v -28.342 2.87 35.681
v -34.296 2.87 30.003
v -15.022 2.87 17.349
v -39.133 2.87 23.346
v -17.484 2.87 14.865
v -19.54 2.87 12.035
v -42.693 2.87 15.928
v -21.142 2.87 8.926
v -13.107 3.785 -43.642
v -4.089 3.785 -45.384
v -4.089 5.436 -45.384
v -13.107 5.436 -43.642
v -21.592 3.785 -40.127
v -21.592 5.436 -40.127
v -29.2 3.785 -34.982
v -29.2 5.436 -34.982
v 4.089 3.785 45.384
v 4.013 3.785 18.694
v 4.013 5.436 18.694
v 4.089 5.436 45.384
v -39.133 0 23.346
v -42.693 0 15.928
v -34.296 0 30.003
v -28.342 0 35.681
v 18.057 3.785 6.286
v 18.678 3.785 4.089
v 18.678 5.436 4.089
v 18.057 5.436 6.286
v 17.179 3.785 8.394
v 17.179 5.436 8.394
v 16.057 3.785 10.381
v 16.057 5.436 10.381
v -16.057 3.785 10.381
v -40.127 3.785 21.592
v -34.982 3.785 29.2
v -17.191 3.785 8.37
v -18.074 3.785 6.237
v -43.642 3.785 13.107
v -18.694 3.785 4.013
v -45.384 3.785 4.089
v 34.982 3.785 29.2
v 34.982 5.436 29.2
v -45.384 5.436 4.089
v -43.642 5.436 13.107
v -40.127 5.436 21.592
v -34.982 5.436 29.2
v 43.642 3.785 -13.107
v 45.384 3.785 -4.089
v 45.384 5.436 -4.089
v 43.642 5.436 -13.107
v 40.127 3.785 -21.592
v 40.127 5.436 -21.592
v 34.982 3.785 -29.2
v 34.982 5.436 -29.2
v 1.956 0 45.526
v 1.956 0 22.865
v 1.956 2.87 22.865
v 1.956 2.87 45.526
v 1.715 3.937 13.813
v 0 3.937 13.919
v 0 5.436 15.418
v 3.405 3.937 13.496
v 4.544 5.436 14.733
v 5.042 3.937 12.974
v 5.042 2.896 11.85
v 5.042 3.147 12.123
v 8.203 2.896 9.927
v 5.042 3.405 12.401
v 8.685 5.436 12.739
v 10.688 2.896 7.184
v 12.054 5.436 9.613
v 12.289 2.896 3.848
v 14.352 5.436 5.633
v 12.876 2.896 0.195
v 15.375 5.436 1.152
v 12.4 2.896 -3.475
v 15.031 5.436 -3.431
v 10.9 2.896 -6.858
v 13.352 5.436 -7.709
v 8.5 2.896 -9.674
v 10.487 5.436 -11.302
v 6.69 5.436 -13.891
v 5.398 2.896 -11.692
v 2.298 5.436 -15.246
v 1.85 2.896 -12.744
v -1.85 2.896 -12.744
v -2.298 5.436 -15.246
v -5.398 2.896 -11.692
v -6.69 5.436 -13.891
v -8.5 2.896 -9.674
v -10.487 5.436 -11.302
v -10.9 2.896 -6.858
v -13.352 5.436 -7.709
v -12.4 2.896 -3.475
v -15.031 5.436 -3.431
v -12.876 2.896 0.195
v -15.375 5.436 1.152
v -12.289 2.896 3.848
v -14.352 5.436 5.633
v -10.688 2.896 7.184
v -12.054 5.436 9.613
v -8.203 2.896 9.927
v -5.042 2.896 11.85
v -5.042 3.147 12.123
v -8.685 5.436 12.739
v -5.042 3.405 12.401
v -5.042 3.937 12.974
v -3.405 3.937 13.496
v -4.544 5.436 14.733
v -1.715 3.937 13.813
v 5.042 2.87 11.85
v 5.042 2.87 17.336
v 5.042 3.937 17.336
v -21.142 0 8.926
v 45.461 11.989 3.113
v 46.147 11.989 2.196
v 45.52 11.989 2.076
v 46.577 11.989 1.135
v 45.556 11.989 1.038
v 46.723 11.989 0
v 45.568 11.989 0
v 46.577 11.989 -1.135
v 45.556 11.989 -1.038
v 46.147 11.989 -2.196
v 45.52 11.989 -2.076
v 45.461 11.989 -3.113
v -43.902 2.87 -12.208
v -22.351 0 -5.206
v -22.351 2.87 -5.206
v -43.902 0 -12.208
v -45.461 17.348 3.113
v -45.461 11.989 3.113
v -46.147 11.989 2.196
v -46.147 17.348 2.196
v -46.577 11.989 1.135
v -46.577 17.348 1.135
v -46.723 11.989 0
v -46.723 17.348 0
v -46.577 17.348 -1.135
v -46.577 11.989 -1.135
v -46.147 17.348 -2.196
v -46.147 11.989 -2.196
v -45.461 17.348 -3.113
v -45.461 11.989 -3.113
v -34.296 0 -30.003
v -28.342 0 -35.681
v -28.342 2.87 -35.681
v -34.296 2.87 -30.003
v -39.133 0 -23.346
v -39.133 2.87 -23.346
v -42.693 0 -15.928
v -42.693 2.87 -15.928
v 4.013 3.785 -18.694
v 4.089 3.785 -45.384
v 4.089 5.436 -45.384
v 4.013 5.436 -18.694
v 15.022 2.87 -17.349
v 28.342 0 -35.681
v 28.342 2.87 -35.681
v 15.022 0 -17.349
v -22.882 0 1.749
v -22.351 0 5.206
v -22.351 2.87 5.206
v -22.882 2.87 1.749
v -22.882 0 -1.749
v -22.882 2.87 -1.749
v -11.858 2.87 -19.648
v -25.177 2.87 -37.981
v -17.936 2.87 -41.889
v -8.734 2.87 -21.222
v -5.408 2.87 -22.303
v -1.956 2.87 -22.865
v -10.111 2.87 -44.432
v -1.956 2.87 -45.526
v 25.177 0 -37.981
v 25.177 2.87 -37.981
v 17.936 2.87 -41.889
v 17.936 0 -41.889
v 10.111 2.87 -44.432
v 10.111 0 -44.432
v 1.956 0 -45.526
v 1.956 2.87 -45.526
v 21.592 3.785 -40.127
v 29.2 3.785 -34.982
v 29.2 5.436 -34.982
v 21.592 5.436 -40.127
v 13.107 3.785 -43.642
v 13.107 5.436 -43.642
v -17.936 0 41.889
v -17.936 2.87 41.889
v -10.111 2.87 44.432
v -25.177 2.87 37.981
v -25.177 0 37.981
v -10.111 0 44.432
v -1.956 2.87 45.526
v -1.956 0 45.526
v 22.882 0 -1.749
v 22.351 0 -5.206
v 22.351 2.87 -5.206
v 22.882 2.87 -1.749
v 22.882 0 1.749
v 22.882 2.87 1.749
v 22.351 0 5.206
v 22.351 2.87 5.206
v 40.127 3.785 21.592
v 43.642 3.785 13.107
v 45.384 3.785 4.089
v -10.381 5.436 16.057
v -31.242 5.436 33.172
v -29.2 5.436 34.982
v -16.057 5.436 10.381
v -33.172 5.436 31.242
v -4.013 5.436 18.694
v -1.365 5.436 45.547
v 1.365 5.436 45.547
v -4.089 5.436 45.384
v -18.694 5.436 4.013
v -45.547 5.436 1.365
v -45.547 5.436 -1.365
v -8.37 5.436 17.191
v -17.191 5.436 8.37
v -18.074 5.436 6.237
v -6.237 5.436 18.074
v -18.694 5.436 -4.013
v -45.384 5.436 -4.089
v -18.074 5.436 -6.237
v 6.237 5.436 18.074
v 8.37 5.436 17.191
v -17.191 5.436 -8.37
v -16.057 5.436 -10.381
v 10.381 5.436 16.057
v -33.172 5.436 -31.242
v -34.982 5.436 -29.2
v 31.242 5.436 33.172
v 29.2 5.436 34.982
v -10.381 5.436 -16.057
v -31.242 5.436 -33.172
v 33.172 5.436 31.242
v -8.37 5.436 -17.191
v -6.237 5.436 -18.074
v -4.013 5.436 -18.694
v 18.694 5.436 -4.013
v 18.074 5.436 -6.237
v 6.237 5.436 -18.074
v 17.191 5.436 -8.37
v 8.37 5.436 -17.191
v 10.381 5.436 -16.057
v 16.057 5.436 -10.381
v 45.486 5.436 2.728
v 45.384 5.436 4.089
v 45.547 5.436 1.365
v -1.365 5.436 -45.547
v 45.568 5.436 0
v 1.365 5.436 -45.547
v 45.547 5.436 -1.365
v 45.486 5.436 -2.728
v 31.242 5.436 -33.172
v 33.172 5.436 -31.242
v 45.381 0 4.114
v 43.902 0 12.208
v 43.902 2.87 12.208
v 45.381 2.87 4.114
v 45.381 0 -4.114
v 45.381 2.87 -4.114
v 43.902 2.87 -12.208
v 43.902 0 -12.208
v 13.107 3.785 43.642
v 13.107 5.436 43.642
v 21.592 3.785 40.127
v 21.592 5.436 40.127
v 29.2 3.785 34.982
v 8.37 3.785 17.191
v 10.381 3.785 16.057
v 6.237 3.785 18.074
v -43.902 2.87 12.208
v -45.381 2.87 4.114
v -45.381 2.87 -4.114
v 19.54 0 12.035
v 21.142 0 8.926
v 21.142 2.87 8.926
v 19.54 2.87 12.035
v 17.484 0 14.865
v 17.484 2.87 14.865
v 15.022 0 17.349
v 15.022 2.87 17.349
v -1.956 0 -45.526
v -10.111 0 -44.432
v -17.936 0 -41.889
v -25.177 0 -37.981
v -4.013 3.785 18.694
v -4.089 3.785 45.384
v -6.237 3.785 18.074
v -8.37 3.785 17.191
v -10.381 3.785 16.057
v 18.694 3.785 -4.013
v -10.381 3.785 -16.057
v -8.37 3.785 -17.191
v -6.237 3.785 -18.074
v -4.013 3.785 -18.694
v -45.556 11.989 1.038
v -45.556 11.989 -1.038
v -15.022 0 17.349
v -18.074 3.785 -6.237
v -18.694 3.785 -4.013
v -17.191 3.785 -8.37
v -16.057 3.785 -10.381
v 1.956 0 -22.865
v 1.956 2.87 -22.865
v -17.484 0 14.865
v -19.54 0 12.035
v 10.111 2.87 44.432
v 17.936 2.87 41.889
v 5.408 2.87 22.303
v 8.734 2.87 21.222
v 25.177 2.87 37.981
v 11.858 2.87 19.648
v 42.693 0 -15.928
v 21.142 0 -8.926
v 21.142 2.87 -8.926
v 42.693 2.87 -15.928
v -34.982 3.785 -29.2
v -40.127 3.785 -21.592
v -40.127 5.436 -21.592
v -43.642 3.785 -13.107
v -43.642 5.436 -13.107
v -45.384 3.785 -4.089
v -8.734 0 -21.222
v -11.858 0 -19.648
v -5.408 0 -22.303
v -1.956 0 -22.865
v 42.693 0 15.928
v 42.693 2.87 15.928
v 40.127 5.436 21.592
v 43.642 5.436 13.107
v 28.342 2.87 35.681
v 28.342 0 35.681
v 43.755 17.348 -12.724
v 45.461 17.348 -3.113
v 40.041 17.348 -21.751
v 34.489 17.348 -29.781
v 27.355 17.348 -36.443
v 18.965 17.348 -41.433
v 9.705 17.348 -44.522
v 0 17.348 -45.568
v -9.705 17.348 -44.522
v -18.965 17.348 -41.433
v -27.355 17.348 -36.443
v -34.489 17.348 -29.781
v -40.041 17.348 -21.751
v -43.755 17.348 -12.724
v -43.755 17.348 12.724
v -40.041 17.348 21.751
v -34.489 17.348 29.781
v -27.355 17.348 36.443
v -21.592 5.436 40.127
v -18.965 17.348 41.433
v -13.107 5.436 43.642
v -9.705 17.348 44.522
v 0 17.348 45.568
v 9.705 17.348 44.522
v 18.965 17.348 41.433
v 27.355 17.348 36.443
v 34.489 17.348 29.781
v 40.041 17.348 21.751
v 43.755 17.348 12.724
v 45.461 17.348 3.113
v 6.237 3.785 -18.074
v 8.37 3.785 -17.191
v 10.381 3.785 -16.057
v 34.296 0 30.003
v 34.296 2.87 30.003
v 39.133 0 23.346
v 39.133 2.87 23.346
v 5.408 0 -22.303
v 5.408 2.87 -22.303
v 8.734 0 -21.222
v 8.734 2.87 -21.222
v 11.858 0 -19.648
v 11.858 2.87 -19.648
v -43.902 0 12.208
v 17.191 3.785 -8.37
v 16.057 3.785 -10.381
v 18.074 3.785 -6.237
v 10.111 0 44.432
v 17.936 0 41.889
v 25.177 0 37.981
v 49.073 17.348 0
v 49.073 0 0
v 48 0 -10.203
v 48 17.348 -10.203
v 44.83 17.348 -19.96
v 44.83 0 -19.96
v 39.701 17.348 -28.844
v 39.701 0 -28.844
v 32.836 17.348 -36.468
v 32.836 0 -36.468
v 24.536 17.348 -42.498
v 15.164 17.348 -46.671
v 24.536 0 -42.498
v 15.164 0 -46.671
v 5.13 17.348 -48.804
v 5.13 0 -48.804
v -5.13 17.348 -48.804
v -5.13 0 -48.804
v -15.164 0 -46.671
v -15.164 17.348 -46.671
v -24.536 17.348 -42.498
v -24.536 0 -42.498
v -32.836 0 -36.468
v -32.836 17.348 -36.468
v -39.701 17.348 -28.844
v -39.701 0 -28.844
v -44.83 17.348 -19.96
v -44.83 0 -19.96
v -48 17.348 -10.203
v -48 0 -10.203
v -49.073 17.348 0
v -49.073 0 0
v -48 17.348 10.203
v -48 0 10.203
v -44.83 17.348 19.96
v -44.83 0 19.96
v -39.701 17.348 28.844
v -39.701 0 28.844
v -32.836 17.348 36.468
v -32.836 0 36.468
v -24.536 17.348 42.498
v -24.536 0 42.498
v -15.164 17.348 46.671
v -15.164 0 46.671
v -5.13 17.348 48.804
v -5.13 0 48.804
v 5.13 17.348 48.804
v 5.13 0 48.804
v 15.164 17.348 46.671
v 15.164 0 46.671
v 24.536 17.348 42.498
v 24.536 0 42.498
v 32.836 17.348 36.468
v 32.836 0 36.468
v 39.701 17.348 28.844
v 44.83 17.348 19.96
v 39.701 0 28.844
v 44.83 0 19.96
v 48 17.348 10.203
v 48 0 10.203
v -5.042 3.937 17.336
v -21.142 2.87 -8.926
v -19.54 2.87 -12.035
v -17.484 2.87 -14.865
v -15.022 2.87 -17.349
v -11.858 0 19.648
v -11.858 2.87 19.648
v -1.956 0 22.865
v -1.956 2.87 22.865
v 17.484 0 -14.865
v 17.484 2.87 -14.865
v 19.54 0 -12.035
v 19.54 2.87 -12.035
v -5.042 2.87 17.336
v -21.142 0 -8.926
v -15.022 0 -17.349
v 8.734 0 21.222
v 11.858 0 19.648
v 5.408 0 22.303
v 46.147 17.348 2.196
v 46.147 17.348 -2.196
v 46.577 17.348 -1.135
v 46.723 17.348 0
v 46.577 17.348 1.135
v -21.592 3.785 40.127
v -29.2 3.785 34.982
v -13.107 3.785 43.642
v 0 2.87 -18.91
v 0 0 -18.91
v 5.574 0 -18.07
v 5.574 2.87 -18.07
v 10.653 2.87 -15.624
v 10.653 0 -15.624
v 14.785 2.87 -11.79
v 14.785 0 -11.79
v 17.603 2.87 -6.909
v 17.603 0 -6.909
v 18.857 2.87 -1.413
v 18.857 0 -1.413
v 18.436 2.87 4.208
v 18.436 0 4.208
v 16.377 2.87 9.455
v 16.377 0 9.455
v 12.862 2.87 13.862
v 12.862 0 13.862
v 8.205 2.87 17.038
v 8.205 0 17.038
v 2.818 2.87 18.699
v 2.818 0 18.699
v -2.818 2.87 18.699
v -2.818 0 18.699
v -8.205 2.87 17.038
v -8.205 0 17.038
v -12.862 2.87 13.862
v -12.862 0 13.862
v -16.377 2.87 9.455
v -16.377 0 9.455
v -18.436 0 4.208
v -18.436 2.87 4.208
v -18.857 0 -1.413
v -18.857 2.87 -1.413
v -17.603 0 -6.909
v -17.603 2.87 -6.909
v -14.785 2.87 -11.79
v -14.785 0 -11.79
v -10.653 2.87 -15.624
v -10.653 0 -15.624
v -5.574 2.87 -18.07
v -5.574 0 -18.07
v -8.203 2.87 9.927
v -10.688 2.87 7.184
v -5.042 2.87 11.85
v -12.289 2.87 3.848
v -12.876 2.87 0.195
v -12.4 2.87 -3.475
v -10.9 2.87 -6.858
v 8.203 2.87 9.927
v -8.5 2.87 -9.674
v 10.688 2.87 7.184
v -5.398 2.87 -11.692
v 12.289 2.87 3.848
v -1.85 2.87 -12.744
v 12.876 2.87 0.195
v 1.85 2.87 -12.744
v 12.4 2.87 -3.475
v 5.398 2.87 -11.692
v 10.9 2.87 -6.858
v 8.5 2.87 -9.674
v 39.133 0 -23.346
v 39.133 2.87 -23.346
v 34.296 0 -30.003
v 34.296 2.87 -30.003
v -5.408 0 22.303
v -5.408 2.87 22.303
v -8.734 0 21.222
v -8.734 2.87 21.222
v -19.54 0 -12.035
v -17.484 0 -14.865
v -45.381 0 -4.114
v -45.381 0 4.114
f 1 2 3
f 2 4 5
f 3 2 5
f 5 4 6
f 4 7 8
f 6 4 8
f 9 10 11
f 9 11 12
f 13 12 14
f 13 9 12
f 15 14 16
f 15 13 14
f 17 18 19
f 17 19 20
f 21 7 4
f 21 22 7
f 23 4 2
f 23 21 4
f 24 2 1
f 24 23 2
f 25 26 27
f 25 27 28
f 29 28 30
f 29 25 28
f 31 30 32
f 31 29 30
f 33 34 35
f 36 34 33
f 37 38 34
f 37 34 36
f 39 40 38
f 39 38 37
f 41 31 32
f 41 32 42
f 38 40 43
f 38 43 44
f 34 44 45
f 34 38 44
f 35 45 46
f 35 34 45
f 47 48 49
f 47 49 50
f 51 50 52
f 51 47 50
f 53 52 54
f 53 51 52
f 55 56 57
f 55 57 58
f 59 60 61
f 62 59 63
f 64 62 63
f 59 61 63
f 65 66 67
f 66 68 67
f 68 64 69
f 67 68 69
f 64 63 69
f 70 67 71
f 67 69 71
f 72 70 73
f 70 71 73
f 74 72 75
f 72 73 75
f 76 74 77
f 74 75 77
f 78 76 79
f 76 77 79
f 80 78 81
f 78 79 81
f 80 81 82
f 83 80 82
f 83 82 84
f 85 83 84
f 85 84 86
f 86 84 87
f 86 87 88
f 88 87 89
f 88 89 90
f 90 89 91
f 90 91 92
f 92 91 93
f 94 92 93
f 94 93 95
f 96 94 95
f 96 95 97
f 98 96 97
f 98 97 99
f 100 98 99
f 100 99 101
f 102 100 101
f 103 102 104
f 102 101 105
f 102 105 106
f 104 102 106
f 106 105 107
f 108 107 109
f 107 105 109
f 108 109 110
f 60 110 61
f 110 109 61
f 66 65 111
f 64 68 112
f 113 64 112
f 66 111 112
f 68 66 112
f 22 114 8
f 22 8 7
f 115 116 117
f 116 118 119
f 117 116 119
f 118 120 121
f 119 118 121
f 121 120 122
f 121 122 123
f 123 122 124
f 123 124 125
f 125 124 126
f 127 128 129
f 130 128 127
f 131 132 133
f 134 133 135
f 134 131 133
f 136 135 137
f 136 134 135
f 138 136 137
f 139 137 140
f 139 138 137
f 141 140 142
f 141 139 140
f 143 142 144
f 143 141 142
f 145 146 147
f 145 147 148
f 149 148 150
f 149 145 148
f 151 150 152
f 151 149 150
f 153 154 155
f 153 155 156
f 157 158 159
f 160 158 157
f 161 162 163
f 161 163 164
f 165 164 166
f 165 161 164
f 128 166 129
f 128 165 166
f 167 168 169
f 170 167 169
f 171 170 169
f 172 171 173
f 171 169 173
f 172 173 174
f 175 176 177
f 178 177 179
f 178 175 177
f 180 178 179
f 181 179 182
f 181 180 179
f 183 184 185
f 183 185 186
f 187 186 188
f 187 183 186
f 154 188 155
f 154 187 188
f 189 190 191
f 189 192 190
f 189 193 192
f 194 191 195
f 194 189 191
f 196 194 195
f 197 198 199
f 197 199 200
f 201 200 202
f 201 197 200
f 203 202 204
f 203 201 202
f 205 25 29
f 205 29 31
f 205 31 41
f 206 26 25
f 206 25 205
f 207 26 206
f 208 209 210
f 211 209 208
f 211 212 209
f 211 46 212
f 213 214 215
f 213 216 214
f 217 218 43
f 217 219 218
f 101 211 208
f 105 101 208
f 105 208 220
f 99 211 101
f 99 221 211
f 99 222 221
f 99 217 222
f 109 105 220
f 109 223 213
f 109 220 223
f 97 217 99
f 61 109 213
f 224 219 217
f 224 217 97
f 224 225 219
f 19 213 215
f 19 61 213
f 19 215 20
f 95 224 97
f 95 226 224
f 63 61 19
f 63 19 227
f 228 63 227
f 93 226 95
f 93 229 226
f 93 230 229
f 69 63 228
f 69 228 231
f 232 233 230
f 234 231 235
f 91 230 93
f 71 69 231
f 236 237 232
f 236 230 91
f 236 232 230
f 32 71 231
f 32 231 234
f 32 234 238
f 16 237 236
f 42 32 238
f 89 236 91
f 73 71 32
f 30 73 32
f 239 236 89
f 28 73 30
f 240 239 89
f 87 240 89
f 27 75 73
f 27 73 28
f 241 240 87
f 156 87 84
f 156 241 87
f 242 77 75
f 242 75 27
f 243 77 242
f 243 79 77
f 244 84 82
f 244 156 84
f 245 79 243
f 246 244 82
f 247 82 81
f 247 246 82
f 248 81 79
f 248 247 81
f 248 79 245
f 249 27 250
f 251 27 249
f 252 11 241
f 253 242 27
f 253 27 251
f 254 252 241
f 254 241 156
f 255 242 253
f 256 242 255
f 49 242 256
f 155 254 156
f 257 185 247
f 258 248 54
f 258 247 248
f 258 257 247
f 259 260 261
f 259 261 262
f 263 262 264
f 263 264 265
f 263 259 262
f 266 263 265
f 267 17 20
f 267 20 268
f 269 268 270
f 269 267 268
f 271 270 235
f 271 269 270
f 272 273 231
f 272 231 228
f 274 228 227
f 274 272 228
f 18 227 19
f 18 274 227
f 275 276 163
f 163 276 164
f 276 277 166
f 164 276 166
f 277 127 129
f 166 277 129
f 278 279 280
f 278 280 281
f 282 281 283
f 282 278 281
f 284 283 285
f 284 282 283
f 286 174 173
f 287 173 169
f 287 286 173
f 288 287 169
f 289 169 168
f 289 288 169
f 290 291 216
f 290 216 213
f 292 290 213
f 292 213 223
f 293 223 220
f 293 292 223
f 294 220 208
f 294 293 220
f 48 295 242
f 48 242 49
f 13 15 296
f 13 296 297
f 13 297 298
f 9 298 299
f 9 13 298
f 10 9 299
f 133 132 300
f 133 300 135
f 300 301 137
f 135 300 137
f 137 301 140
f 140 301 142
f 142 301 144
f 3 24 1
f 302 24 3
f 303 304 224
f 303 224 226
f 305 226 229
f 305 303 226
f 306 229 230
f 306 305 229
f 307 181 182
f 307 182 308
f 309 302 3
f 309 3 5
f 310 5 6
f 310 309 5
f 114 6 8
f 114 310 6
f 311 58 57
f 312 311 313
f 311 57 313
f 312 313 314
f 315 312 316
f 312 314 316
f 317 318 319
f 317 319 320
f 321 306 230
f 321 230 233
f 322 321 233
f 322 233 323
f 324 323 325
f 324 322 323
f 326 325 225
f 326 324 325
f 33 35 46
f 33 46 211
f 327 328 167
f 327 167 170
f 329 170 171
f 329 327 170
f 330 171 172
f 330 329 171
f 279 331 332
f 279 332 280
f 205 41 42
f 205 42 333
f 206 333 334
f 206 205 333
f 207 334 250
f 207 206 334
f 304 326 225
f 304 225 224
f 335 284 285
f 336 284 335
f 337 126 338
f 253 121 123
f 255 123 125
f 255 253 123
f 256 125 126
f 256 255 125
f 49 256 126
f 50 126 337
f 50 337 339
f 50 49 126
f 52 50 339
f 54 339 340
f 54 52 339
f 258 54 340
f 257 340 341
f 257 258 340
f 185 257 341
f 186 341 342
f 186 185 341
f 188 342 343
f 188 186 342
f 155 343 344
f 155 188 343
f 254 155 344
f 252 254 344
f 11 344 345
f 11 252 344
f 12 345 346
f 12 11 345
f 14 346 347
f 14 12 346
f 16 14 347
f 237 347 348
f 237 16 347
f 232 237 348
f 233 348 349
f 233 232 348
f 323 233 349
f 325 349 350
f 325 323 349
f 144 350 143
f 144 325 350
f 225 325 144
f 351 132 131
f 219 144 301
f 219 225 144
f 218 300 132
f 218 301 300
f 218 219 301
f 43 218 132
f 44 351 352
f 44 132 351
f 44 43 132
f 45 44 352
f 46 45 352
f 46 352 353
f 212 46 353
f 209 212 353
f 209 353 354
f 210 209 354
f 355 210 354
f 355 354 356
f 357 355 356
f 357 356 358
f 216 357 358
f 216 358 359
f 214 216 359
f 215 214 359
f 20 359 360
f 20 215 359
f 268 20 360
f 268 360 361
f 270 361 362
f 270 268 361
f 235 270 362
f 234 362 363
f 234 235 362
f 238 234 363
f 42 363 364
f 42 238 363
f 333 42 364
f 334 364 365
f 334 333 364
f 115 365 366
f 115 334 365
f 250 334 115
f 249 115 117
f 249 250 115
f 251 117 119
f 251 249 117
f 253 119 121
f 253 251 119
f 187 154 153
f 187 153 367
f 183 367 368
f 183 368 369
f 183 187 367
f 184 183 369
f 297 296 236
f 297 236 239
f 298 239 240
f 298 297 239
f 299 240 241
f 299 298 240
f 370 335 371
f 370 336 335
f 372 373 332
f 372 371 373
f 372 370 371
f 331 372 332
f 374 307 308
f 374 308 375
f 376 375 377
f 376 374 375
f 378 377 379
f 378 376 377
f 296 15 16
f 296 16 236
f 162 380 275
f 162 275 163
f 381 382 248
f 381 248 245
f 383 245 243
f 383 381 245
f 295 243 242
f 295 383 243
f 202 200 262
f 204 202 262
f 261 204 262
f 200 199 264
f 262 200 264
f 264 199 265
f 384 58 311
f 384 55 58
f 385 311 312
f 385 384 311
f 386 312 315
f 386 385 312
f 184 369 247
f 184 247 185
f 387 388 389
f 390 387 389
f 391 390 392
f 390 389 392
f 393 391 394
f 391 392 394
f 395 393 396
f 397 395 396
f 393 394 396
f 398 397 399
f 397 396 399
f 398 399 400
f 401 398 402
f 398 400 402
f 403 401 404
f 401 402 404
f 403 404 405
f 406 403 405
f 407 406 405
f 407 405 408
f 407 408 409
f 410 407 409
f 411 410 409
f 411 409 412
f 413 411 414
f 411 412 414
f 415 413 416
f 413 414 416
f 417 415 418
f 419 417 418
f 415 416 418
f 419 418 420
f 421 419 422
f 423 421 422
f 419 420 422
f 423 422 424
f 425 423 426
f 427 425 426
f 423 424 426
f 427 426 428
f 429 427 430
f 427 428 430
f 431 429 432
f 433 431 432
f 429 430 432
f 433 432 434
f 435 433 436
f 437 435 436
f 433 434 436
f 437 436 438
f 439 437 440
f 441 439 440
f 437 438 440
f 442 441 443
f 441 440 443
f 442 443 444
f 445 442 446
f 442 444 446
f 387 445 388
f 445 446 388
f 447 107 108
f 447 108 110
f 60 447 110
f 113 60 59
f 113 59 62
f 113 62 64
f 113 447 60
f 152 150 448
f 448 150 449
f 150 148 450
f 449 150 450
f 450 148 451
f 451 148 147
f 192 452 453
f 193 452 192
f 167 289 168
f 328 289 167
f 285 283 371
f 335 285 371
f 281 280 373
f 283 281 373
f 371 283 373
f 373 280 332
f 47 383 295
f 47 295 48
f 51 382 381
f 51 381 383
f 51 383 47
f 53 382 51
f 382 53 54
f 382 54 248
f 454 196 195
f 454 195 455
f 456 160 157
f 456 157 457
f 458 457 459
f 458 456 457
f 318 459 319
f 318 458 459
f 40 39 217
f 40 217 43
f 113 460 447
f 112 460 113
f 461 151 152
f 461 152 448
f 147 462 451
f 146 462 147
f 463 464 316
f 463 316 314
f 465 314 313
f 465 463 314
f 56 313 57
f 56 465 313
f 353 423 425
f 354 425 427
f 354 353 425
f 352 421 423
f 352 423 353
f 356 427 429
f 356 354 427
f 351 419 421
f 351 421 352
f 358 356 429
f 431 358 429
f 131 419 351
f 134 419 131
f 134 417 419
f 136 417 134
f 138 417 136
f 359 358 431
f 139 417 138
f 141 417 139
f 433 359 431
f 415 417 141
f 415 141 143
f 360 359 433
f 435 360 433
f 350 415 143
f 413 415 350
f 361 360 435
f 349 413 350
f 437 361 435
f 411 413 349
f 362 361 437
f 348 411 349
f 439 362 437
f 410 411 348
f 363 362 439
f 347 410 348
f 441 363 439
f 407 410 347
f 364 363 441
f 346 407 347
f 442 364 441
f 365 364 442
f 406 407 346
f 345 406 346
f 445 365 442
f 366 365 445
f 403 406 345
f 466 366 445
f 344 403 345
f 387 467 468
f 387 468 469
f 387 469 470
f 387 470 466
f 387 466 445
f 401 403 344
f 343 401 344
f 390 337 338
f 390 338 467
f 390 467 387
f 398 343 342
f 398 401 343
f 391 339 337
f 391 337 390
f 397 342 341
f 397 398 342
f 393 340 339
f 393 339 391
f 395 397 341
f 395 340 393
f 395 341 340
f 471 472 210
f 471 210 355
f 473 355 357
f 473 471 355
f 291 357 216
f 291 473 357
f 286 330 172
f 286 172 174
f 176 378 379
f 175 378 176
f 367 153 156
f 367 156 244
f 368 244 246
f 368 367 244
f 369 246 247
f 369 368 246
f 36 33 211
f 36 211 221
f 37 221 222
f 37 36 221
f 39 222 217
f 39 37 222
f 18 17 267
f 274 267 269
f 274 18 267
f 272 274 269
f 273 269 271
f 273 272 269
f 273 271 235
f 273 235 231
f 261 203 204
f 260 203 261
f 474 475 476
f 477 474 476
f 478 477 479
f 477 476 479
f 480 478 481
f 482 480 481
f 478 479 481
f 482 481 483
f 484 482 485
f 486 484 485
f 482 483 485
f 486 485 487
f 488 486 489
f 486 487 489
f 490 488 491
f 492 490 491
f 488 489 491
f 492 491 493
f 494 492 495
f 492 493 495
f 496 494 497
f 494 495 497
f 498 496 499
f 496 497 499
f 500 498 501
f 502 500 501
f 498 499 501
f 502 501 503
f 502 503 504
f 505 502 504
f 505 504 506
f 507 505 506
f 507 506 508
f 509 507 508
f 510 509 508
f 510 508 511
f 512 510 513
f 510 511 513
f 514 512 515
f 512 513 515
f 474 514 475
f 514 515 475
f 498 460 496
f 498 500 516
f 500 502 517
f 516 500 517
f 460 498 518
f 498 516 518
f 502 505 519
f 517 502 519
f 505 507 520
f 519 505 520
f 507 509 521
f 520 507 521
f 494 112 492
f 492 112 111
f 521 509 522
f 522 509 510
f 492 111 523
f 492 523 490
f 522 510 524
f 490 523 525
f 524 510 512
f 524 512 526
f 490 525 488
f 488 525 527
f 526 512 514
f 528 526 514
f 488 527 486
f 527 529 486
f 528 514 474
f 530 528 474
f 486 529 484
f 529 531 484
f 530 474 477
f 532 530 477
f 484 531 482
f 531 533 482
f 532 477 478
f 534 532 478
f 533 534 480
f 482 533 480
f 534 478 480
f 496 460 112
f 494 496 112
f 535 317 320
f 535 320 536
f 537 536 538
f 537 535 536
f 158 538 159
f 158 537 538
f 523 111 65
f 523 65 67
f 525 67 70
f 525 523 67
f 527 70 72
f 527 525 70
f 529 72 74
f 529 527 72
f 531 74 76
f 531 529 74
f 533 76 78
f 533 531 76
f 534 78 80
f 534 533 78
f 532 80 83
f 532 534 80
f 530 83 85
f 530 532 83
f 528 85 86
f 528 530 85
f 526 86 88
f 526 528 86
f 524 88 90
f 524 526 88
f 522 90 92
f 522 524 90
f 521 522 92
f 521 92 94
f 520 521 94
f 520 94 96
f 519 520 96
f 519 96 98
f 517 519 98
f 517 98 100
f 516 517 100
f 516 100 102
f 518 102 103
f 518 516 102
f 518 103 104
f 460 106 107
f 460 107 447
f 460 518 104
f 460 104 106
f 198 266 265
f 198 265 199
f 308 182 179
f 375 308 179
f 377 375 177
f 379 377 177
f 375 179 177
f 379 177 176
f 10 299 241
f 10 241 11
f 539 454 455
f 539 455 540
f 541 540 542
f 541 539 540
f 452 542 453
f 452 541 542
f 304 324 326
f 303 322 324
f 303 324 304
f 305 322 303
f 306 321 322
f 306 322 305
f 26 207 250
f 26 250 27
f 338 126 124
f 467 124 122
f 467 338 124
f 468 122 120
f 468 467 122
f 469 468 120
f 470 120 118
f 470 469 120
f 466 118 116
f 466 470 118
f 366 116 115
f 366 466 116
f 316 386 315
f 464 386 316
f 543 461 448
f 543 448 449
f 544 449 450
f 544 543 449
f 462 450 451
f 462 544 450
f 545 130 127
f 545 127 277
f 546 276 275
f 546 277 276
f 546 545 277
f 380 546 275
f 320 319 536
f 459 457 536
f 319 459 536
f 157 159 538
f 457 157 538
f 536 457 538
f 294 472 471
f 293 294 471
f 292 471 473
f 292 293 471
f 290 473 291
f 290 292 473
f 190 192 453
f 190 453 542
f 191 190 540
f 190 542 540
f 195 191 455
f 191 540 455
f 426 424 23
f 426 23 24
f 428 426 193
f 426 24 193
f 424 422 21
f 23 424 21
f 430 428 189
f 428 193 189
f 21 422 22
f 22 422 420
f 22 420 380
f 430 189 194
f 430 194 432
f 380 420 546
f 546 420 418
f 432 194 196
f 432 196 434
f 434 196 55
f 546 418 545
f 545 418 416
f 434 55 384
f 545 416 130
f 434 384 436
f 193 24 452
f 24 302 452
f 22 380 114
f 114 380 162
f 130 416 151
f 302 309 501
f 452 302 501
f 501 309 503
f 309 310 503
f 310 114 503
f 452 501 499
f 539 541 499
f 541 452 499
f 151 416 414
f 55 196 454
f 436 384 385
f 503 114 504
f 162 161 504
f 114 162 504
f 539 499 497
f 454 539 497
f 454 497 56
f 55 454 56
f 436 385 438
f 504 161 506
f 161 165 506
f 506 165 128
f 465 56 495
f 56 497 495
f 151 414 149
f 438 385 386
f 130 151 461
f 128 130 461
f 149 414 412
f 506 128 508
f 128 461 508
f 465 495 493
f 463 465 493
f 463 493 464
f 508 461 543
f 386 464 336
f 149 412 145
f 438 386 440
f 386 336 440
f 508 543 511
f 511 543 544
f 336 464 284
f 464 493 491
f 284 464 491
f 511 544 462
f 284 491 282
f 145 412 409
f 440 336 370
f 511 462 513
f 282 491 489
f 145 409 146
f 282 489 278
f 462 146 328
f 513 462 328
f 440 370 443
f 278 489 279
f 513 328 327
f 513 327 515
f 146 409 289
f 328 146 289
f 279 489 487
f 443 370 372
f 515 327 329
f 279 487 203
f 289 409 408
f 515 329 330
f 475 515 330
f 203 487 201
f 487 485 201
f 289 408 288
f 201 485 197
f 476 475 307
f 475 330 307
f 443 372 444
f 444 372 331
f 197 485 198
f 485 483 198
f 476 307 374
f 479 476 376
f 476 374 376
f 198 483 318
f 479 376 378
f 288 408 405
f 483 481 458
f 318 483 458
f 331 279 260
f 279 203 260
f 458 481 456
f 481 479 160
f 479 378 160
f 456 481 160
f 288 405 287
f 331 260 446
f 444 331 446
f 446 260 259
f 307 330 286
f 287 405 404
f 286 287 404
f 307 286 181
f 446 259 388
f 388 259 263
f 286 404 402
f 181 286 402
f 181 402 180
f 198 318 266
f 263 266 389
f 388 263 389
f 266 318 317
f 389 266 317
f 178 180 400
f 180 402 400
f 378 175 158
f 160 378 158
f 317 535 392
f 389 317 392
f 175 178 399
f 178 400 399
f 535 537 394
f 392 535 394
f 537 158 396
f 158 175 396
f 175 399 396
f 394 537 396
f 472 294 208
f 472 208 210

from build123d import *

# Parameters (mm, degrees)
SKETCH1_R           = 49.0728
SKETCH1_R_2         = 45.5676
EXTRUDE_THIN1_DEPTH = 17.3482
SKETCH2_R           = 18.9103
BOSS_EXTRUDE1_DEPTH = 2.8702
SKETCH3_R           = 48.26
SKETCH3_R_2         = 12.8778
BOSS_EXTRUDE2_DEPTH = 2.5654
CHAMFER1_SIZE       = 2.54
SKETCH4_W           = 10.0838
SKETCH4_H           = 6.023980684
CUT_EXTRUDE1_DEPTH  = 1.0668
CUT_EXTRUDE2_START  = -1.651
CUT_EXTRUDE2_DEPTH  = 1.651
CUT_EXTRUDE3_DEPTH  = 5.3594


with BuildPart() as part:
    # Sketch1 → Extrude-Thin1 (new body)
    with BuildSketch(Plane(origin=(0, 0, 0), x_dir=(1, 0, 0), z_dir=(0, 1, 0))):
        Circle(SKETCH1_R)
        Circle(SKETCH1_R_2, mode=Mode.SUBTRACT)
    extrude(amount=EXTRUDE_THIN1_DEPTH)



with BuildPart() as body_2:
    # Sketch2 → Boss-Extrude1 (new body)
    with BuildSketch(Plane.XZ):
        with BuildLine():
            Line((-1.9558, 45.525608355), (-1.9558, 22.865407444))
            ThreePointArc((-1.9558, 22.865407444), (-7.091600102, 21.825700887), (-11.857673846, 19.648093602))
            Line((-11.857673846, 19.648093602), (-25.177005755, 37.980581235))
            ThreePointArc((-25.177005755, 37.980581235), (-26.783963262, 36.864962793), (-28.34155663, 35.681400442))
            Line((-28.34155663, 35.681400442), (-15.022224721, 17.348912809))
            ThreePointArc((-15.022224721, 17.348912809), (-18.566050102, 13.489024976), (-21.14191931, 8.925875818))
            Line((-21.14191931, 8.925875818), (-42.693051047, 15.928262996))
            ThreePointArc((-42.693051047, 15.928262996), (-43.337362912, 14.081162793), (-43.901801922, 12.208110326))
            Line((-43.901801922, 12.208110326), (-22.350670185, 5.205723149))
            ThreePointArc((-22.350670185, 5.205723149), (-22.9489, 0), (-22.350670185, -5.205723149))
            Line((-22.350670185, -5.205723149), (-43.901801922, -12.208110326))
            ThreePointArc((-43.901801922, -12.208110326), (-43.337362912, -14.081162793), (-42.693051047, -15.928262996))
            Line((-42.693051047, -15.928262996), (-21.14191931, -8.925875818))
            ThreePointArc((-21.14191931, -8.925875818), (-18.566050102, -13.489024976), (-15.022224721, -17.348912809))
            Line((-15.022224721, -17.348912809), (-28.34155663, -35.681400442))
            ThreePointArc((-28.34155663, -35.681400442), (-26.783963262, -36.864962793), (-25.177005755, -37.980581235))
            Line((-25.177005755, -37.980581235), (-11.857673846, -19.648093602))
            ThreePointArc((-11.857673846, -19.648093602), (-7.091600102, -21.825700887), (-1.9558, -22.865407444))
            Line((-1.9558, -22.865407444), (-1.9558, -45.525608355))
            ThreePointArc((-1.9558, -45.525608355), (0, -45.5676), (1.9558, -45.525608355))
            Line((1.9558, -45.525608355), (1.9558, -22.865407444))
            ThreePointArc((1.9558, -22.865407444), (7.091600102, -21.825700887), (11.857673846, -19.648093602))
            Line((11.857673846, -19.648093602), (25.177005755, -37.980581235))
            ThreePointArc((25.177005755, -37.980581235), (26.783963262, -36.864962793), (28.34155663, -35.681400442))
            Line((28.34155663, -35.681400442), (15.022224721, -17.348912809))
            ThreePointArc((15.022224721, -17.348912809), (18.566050102, -13.489024976), (21.14191931, -8.925875818))
            Line((21.14191931, -8.925875818), (42.693051047, -15.928262996))
            ThreePointArc((42.693051047, -15.928262996), (43.337362912, -14.081162793), (43.901801922, -12.208110326))
            Line((43.901801922, -12.208110326), (22.350670185, -5.205723149))
            ThreePointArc((22.350670185, -5.205723149), (22.9489, 0), (22.350670185, 5.205723149))
            Line((22.350670185, 5.205723149), (43.901801922, 12.208110326))
            ThreePointArc((43.901801922, 12.208110326), (43.337362912, 14.081162793), (42.693051047, 15.928262996))
            Line((42.693051047, 15.928262996), (21.14191931, 8.925875818))
            ThreePointArc((21.14191931, 8.925875818), (18.566050102, 13.489024976), (15.022224721, 17.348912809))
            Line((15.022224721, 17.348912809), (28.34155663, 35.681400442))
            ThreePointArc((28.34155663, 35.681400442), (26.783963262, 36.864962793), (25.177005755, 37.980581235))
            Line((25.177005755, 37.980581235), (11.857673846, 19.648093602))
            ThreePointArc((11.857673846, 19.648093602), (7.091600102, 21.825700887), (1.9558, 22.865407444))
            Line((1.9558, 22.865407444), (1.9558, 45.525608355))
            ThreePointArc((1.9558, 45.525608355), (0, 45.5676), (-1.9558, 45.525608355))
        make_face()
        Circle(SKETCH2_R, mode=Mode.SUBTRACT)
    extrude(amount=-BOSS_EXTRUDE1_DEPTH)


with BuildPart() as part_1:
    add(part.part)

    add(body_2.part)  # Boss-Extrude2 merges body 2
    # Sketch3 → Boss-Extrude2 (add)
    with BuildSketch(Plane(origin=(0, 2.8702, 0), x_dir=(1, 0, 0), z_dir=(0, 1, 0))):
        Circle(SKETCH3_R)
        Circle(SKETCH3_R_2, mode=Mode.SUBTRACT)
    extrude(amount=BOSS_EXTRUDE2_DEPTH)

    # Chamfer1
    chamfer1_edges = [part_1.edges().sort_by_distance(p)[0] for p in [
        (-12.8778, 5.4356, 0),
    ]]
    chamfer(chamfer1_edges, length=CHAMFER1_SIZE)

    # Sketch4 → Cut-Extrude1 (cut)
    with BuildSketch(Plane.XZ.offset(-2.8702)):
        with Locations((0, 14.323509658)):
            Rectangle(SKETCH4_W, SKETCH4_H)
    extrude(amount=-CUT_EXTRUDE1_DEPTH, mode=Mode.SUBTRACT)

    # Sketch6 → Cut-Extrude2 (cut)
    with BuildSketch(Plane(origin=(0, 5.4356, 0), x_dir=(1, 0, 0), z_dir=(0, 1, 0)).offset(CUT_EXTRUDE2_START)):
        with BuildLine():
            Line((-4.0132, 18.6944), (-4.088878764, 45.38377728))
            ThreePointArc((-4.088878764, 45.38377728), (-17.437965573, 42.098972986), (-29.19990277, 34.982450572))
            Line((-29.19990277, 34.982450572), (-10.381176076, 16.056697944))
            ThreePointArc((-10.381176076, 16.056697944), (-7.317026971, 17.664865749), (-4.0132, 18.6944))
        make_face()
        with BuildLine():
            ThreePointArc((29.19990277, 34.982450572), (17.437965573, 42.098972986), (4.088878764, 45.38377728))
            Line((4.088878764, 45.38377728), (4.0132, 18.6944))
            ThreePointArc((4.0132, 18.6944), (7.317026971, 17.664865749), (10.381176076, 16.056697944))
            Line((10.381176076, 16.056697944), (29.19990277, 34.982450572))
        make_face()
        with BuildLine():
            ThreePointArc((-18.6944, 4.0132), (-17.664865749, 7.317026971), (-16.056697944, 10.381176076))
            Line((-16.056697944, 10.381176076), (-34.982450572, 29.19990277))
            ThreePointArc((-34.982450572, 29.19990277), (-42.098972986, 17.437965573), (-45.38377728, 4.088878764))
            Line((-45.38377728, 4.088878764), (-18.6944, 4.0132))
        make_face()
        with BuildLine():
            Line((34.982450572, 29.19990277), (16.056697944, 10.381176076))
            ThreePointArc((16.056697944, 10.381176076), (17.664865749, 7.317026971), (18.6944, 4.0132))
            Line((18.6944, 4.0132), (45.38377728, 4.088878764))
            ThreePointArc((45.38377728, 4.088878764), (42.098972986, 17.437965573), (34.982450572, 29.19990277))
        make_face()
        with BuildLine():
            ThreePointArc((-16.056697944, -10.381176076), (-17.664865749, -7.317026971), (-18.6944, -4.0132))
            Line((-18.6944, -4.0132), (-45.38377728, -4.088878764))
            ThreePointArc((-45.38377728, -4.088878764), (-42.098972986, -17.437965573), (-34.982450572, -29.19990277))
            Line((-34.982450572, -29.19990277), (-16.056697944, -10.381176076))
        make_face()
        with BuildLine():
            Line((45.383730316, -4.0894), (18.677879249, -4.0894))
            ThreePointArc((18.677879249, -4.0894), (17.649910049, -7.353029366), (16.056697944, -10.381176076))
            Line((16.056697944, -10.381176076), (34.982450572, -29.19990277))
            ThreePointArc((34.982450572, -29.19990277), (42.098872847, -17.438207328), (45.383730316, -4.0894))
        make_face()
        with BuildLine():
            ThreePointArc((-4.0132, -18.6944), (-7.317026971, -17.664865749), (-10.381176076, -16.056697944))
            Line((-10.381176076, -16.056697944), (-29.19990277, -34.982450572))
            ThreePointArc((-29.19990277, -34.982450572), (-17.437965573, -42.098972986), (-4.088878764, -45.38377728))
            Line((-4.088878764, -45.38377728), (-4.0132, -18.6944))
        make_face()
        with BuildLine():
            Line((29.19990277, -34.982450572), (10.381176076, -16.056697944))
            ThreePointArc((10.381176076, -16.056697944), (7.317026971, -17.664865749), (4.0132, -18.6944))
            Line((4.0132, -18.6944), (4.088878764, -45.38377728))
            ThreePointArc((4.088878764, -45.38377728), (17.437965573, -42.098972986), (29.19990277, -34.982450572))
        make_face()
    extrude(amount=CUT_EXTRUDE2_DEPTH, mode=Mode.SUBTRACT)

    # Sketch7 → Cut-Extrude3 (cut)
    with BuildSketch(Plane(origin=(0, 17.3482, 0), x_dir=(1, 0, 0), z_dir=(0, 1, 0))):
        with BuildLine():
            Line((-45.399557639, 3.175), (-45.399557639, -3.175))
            ThreePointArc((-45.399557639, -3.175), (-46.72329814, 0), (-45.399557639, 3.175))
        make_face()
        with BuildLine():
            Line((45.3995595, -3.175), (45.3995595, 3.175))
            ThreePointArc((45.3995595, 3.175), (46.7233, 0), (45.3995595, -3.175))
        make_face()
    extrude(amount=-CUT_EXTRUDE3_DEPTH, mode=Mode.SUBTRACT)


solid = part_1.part
